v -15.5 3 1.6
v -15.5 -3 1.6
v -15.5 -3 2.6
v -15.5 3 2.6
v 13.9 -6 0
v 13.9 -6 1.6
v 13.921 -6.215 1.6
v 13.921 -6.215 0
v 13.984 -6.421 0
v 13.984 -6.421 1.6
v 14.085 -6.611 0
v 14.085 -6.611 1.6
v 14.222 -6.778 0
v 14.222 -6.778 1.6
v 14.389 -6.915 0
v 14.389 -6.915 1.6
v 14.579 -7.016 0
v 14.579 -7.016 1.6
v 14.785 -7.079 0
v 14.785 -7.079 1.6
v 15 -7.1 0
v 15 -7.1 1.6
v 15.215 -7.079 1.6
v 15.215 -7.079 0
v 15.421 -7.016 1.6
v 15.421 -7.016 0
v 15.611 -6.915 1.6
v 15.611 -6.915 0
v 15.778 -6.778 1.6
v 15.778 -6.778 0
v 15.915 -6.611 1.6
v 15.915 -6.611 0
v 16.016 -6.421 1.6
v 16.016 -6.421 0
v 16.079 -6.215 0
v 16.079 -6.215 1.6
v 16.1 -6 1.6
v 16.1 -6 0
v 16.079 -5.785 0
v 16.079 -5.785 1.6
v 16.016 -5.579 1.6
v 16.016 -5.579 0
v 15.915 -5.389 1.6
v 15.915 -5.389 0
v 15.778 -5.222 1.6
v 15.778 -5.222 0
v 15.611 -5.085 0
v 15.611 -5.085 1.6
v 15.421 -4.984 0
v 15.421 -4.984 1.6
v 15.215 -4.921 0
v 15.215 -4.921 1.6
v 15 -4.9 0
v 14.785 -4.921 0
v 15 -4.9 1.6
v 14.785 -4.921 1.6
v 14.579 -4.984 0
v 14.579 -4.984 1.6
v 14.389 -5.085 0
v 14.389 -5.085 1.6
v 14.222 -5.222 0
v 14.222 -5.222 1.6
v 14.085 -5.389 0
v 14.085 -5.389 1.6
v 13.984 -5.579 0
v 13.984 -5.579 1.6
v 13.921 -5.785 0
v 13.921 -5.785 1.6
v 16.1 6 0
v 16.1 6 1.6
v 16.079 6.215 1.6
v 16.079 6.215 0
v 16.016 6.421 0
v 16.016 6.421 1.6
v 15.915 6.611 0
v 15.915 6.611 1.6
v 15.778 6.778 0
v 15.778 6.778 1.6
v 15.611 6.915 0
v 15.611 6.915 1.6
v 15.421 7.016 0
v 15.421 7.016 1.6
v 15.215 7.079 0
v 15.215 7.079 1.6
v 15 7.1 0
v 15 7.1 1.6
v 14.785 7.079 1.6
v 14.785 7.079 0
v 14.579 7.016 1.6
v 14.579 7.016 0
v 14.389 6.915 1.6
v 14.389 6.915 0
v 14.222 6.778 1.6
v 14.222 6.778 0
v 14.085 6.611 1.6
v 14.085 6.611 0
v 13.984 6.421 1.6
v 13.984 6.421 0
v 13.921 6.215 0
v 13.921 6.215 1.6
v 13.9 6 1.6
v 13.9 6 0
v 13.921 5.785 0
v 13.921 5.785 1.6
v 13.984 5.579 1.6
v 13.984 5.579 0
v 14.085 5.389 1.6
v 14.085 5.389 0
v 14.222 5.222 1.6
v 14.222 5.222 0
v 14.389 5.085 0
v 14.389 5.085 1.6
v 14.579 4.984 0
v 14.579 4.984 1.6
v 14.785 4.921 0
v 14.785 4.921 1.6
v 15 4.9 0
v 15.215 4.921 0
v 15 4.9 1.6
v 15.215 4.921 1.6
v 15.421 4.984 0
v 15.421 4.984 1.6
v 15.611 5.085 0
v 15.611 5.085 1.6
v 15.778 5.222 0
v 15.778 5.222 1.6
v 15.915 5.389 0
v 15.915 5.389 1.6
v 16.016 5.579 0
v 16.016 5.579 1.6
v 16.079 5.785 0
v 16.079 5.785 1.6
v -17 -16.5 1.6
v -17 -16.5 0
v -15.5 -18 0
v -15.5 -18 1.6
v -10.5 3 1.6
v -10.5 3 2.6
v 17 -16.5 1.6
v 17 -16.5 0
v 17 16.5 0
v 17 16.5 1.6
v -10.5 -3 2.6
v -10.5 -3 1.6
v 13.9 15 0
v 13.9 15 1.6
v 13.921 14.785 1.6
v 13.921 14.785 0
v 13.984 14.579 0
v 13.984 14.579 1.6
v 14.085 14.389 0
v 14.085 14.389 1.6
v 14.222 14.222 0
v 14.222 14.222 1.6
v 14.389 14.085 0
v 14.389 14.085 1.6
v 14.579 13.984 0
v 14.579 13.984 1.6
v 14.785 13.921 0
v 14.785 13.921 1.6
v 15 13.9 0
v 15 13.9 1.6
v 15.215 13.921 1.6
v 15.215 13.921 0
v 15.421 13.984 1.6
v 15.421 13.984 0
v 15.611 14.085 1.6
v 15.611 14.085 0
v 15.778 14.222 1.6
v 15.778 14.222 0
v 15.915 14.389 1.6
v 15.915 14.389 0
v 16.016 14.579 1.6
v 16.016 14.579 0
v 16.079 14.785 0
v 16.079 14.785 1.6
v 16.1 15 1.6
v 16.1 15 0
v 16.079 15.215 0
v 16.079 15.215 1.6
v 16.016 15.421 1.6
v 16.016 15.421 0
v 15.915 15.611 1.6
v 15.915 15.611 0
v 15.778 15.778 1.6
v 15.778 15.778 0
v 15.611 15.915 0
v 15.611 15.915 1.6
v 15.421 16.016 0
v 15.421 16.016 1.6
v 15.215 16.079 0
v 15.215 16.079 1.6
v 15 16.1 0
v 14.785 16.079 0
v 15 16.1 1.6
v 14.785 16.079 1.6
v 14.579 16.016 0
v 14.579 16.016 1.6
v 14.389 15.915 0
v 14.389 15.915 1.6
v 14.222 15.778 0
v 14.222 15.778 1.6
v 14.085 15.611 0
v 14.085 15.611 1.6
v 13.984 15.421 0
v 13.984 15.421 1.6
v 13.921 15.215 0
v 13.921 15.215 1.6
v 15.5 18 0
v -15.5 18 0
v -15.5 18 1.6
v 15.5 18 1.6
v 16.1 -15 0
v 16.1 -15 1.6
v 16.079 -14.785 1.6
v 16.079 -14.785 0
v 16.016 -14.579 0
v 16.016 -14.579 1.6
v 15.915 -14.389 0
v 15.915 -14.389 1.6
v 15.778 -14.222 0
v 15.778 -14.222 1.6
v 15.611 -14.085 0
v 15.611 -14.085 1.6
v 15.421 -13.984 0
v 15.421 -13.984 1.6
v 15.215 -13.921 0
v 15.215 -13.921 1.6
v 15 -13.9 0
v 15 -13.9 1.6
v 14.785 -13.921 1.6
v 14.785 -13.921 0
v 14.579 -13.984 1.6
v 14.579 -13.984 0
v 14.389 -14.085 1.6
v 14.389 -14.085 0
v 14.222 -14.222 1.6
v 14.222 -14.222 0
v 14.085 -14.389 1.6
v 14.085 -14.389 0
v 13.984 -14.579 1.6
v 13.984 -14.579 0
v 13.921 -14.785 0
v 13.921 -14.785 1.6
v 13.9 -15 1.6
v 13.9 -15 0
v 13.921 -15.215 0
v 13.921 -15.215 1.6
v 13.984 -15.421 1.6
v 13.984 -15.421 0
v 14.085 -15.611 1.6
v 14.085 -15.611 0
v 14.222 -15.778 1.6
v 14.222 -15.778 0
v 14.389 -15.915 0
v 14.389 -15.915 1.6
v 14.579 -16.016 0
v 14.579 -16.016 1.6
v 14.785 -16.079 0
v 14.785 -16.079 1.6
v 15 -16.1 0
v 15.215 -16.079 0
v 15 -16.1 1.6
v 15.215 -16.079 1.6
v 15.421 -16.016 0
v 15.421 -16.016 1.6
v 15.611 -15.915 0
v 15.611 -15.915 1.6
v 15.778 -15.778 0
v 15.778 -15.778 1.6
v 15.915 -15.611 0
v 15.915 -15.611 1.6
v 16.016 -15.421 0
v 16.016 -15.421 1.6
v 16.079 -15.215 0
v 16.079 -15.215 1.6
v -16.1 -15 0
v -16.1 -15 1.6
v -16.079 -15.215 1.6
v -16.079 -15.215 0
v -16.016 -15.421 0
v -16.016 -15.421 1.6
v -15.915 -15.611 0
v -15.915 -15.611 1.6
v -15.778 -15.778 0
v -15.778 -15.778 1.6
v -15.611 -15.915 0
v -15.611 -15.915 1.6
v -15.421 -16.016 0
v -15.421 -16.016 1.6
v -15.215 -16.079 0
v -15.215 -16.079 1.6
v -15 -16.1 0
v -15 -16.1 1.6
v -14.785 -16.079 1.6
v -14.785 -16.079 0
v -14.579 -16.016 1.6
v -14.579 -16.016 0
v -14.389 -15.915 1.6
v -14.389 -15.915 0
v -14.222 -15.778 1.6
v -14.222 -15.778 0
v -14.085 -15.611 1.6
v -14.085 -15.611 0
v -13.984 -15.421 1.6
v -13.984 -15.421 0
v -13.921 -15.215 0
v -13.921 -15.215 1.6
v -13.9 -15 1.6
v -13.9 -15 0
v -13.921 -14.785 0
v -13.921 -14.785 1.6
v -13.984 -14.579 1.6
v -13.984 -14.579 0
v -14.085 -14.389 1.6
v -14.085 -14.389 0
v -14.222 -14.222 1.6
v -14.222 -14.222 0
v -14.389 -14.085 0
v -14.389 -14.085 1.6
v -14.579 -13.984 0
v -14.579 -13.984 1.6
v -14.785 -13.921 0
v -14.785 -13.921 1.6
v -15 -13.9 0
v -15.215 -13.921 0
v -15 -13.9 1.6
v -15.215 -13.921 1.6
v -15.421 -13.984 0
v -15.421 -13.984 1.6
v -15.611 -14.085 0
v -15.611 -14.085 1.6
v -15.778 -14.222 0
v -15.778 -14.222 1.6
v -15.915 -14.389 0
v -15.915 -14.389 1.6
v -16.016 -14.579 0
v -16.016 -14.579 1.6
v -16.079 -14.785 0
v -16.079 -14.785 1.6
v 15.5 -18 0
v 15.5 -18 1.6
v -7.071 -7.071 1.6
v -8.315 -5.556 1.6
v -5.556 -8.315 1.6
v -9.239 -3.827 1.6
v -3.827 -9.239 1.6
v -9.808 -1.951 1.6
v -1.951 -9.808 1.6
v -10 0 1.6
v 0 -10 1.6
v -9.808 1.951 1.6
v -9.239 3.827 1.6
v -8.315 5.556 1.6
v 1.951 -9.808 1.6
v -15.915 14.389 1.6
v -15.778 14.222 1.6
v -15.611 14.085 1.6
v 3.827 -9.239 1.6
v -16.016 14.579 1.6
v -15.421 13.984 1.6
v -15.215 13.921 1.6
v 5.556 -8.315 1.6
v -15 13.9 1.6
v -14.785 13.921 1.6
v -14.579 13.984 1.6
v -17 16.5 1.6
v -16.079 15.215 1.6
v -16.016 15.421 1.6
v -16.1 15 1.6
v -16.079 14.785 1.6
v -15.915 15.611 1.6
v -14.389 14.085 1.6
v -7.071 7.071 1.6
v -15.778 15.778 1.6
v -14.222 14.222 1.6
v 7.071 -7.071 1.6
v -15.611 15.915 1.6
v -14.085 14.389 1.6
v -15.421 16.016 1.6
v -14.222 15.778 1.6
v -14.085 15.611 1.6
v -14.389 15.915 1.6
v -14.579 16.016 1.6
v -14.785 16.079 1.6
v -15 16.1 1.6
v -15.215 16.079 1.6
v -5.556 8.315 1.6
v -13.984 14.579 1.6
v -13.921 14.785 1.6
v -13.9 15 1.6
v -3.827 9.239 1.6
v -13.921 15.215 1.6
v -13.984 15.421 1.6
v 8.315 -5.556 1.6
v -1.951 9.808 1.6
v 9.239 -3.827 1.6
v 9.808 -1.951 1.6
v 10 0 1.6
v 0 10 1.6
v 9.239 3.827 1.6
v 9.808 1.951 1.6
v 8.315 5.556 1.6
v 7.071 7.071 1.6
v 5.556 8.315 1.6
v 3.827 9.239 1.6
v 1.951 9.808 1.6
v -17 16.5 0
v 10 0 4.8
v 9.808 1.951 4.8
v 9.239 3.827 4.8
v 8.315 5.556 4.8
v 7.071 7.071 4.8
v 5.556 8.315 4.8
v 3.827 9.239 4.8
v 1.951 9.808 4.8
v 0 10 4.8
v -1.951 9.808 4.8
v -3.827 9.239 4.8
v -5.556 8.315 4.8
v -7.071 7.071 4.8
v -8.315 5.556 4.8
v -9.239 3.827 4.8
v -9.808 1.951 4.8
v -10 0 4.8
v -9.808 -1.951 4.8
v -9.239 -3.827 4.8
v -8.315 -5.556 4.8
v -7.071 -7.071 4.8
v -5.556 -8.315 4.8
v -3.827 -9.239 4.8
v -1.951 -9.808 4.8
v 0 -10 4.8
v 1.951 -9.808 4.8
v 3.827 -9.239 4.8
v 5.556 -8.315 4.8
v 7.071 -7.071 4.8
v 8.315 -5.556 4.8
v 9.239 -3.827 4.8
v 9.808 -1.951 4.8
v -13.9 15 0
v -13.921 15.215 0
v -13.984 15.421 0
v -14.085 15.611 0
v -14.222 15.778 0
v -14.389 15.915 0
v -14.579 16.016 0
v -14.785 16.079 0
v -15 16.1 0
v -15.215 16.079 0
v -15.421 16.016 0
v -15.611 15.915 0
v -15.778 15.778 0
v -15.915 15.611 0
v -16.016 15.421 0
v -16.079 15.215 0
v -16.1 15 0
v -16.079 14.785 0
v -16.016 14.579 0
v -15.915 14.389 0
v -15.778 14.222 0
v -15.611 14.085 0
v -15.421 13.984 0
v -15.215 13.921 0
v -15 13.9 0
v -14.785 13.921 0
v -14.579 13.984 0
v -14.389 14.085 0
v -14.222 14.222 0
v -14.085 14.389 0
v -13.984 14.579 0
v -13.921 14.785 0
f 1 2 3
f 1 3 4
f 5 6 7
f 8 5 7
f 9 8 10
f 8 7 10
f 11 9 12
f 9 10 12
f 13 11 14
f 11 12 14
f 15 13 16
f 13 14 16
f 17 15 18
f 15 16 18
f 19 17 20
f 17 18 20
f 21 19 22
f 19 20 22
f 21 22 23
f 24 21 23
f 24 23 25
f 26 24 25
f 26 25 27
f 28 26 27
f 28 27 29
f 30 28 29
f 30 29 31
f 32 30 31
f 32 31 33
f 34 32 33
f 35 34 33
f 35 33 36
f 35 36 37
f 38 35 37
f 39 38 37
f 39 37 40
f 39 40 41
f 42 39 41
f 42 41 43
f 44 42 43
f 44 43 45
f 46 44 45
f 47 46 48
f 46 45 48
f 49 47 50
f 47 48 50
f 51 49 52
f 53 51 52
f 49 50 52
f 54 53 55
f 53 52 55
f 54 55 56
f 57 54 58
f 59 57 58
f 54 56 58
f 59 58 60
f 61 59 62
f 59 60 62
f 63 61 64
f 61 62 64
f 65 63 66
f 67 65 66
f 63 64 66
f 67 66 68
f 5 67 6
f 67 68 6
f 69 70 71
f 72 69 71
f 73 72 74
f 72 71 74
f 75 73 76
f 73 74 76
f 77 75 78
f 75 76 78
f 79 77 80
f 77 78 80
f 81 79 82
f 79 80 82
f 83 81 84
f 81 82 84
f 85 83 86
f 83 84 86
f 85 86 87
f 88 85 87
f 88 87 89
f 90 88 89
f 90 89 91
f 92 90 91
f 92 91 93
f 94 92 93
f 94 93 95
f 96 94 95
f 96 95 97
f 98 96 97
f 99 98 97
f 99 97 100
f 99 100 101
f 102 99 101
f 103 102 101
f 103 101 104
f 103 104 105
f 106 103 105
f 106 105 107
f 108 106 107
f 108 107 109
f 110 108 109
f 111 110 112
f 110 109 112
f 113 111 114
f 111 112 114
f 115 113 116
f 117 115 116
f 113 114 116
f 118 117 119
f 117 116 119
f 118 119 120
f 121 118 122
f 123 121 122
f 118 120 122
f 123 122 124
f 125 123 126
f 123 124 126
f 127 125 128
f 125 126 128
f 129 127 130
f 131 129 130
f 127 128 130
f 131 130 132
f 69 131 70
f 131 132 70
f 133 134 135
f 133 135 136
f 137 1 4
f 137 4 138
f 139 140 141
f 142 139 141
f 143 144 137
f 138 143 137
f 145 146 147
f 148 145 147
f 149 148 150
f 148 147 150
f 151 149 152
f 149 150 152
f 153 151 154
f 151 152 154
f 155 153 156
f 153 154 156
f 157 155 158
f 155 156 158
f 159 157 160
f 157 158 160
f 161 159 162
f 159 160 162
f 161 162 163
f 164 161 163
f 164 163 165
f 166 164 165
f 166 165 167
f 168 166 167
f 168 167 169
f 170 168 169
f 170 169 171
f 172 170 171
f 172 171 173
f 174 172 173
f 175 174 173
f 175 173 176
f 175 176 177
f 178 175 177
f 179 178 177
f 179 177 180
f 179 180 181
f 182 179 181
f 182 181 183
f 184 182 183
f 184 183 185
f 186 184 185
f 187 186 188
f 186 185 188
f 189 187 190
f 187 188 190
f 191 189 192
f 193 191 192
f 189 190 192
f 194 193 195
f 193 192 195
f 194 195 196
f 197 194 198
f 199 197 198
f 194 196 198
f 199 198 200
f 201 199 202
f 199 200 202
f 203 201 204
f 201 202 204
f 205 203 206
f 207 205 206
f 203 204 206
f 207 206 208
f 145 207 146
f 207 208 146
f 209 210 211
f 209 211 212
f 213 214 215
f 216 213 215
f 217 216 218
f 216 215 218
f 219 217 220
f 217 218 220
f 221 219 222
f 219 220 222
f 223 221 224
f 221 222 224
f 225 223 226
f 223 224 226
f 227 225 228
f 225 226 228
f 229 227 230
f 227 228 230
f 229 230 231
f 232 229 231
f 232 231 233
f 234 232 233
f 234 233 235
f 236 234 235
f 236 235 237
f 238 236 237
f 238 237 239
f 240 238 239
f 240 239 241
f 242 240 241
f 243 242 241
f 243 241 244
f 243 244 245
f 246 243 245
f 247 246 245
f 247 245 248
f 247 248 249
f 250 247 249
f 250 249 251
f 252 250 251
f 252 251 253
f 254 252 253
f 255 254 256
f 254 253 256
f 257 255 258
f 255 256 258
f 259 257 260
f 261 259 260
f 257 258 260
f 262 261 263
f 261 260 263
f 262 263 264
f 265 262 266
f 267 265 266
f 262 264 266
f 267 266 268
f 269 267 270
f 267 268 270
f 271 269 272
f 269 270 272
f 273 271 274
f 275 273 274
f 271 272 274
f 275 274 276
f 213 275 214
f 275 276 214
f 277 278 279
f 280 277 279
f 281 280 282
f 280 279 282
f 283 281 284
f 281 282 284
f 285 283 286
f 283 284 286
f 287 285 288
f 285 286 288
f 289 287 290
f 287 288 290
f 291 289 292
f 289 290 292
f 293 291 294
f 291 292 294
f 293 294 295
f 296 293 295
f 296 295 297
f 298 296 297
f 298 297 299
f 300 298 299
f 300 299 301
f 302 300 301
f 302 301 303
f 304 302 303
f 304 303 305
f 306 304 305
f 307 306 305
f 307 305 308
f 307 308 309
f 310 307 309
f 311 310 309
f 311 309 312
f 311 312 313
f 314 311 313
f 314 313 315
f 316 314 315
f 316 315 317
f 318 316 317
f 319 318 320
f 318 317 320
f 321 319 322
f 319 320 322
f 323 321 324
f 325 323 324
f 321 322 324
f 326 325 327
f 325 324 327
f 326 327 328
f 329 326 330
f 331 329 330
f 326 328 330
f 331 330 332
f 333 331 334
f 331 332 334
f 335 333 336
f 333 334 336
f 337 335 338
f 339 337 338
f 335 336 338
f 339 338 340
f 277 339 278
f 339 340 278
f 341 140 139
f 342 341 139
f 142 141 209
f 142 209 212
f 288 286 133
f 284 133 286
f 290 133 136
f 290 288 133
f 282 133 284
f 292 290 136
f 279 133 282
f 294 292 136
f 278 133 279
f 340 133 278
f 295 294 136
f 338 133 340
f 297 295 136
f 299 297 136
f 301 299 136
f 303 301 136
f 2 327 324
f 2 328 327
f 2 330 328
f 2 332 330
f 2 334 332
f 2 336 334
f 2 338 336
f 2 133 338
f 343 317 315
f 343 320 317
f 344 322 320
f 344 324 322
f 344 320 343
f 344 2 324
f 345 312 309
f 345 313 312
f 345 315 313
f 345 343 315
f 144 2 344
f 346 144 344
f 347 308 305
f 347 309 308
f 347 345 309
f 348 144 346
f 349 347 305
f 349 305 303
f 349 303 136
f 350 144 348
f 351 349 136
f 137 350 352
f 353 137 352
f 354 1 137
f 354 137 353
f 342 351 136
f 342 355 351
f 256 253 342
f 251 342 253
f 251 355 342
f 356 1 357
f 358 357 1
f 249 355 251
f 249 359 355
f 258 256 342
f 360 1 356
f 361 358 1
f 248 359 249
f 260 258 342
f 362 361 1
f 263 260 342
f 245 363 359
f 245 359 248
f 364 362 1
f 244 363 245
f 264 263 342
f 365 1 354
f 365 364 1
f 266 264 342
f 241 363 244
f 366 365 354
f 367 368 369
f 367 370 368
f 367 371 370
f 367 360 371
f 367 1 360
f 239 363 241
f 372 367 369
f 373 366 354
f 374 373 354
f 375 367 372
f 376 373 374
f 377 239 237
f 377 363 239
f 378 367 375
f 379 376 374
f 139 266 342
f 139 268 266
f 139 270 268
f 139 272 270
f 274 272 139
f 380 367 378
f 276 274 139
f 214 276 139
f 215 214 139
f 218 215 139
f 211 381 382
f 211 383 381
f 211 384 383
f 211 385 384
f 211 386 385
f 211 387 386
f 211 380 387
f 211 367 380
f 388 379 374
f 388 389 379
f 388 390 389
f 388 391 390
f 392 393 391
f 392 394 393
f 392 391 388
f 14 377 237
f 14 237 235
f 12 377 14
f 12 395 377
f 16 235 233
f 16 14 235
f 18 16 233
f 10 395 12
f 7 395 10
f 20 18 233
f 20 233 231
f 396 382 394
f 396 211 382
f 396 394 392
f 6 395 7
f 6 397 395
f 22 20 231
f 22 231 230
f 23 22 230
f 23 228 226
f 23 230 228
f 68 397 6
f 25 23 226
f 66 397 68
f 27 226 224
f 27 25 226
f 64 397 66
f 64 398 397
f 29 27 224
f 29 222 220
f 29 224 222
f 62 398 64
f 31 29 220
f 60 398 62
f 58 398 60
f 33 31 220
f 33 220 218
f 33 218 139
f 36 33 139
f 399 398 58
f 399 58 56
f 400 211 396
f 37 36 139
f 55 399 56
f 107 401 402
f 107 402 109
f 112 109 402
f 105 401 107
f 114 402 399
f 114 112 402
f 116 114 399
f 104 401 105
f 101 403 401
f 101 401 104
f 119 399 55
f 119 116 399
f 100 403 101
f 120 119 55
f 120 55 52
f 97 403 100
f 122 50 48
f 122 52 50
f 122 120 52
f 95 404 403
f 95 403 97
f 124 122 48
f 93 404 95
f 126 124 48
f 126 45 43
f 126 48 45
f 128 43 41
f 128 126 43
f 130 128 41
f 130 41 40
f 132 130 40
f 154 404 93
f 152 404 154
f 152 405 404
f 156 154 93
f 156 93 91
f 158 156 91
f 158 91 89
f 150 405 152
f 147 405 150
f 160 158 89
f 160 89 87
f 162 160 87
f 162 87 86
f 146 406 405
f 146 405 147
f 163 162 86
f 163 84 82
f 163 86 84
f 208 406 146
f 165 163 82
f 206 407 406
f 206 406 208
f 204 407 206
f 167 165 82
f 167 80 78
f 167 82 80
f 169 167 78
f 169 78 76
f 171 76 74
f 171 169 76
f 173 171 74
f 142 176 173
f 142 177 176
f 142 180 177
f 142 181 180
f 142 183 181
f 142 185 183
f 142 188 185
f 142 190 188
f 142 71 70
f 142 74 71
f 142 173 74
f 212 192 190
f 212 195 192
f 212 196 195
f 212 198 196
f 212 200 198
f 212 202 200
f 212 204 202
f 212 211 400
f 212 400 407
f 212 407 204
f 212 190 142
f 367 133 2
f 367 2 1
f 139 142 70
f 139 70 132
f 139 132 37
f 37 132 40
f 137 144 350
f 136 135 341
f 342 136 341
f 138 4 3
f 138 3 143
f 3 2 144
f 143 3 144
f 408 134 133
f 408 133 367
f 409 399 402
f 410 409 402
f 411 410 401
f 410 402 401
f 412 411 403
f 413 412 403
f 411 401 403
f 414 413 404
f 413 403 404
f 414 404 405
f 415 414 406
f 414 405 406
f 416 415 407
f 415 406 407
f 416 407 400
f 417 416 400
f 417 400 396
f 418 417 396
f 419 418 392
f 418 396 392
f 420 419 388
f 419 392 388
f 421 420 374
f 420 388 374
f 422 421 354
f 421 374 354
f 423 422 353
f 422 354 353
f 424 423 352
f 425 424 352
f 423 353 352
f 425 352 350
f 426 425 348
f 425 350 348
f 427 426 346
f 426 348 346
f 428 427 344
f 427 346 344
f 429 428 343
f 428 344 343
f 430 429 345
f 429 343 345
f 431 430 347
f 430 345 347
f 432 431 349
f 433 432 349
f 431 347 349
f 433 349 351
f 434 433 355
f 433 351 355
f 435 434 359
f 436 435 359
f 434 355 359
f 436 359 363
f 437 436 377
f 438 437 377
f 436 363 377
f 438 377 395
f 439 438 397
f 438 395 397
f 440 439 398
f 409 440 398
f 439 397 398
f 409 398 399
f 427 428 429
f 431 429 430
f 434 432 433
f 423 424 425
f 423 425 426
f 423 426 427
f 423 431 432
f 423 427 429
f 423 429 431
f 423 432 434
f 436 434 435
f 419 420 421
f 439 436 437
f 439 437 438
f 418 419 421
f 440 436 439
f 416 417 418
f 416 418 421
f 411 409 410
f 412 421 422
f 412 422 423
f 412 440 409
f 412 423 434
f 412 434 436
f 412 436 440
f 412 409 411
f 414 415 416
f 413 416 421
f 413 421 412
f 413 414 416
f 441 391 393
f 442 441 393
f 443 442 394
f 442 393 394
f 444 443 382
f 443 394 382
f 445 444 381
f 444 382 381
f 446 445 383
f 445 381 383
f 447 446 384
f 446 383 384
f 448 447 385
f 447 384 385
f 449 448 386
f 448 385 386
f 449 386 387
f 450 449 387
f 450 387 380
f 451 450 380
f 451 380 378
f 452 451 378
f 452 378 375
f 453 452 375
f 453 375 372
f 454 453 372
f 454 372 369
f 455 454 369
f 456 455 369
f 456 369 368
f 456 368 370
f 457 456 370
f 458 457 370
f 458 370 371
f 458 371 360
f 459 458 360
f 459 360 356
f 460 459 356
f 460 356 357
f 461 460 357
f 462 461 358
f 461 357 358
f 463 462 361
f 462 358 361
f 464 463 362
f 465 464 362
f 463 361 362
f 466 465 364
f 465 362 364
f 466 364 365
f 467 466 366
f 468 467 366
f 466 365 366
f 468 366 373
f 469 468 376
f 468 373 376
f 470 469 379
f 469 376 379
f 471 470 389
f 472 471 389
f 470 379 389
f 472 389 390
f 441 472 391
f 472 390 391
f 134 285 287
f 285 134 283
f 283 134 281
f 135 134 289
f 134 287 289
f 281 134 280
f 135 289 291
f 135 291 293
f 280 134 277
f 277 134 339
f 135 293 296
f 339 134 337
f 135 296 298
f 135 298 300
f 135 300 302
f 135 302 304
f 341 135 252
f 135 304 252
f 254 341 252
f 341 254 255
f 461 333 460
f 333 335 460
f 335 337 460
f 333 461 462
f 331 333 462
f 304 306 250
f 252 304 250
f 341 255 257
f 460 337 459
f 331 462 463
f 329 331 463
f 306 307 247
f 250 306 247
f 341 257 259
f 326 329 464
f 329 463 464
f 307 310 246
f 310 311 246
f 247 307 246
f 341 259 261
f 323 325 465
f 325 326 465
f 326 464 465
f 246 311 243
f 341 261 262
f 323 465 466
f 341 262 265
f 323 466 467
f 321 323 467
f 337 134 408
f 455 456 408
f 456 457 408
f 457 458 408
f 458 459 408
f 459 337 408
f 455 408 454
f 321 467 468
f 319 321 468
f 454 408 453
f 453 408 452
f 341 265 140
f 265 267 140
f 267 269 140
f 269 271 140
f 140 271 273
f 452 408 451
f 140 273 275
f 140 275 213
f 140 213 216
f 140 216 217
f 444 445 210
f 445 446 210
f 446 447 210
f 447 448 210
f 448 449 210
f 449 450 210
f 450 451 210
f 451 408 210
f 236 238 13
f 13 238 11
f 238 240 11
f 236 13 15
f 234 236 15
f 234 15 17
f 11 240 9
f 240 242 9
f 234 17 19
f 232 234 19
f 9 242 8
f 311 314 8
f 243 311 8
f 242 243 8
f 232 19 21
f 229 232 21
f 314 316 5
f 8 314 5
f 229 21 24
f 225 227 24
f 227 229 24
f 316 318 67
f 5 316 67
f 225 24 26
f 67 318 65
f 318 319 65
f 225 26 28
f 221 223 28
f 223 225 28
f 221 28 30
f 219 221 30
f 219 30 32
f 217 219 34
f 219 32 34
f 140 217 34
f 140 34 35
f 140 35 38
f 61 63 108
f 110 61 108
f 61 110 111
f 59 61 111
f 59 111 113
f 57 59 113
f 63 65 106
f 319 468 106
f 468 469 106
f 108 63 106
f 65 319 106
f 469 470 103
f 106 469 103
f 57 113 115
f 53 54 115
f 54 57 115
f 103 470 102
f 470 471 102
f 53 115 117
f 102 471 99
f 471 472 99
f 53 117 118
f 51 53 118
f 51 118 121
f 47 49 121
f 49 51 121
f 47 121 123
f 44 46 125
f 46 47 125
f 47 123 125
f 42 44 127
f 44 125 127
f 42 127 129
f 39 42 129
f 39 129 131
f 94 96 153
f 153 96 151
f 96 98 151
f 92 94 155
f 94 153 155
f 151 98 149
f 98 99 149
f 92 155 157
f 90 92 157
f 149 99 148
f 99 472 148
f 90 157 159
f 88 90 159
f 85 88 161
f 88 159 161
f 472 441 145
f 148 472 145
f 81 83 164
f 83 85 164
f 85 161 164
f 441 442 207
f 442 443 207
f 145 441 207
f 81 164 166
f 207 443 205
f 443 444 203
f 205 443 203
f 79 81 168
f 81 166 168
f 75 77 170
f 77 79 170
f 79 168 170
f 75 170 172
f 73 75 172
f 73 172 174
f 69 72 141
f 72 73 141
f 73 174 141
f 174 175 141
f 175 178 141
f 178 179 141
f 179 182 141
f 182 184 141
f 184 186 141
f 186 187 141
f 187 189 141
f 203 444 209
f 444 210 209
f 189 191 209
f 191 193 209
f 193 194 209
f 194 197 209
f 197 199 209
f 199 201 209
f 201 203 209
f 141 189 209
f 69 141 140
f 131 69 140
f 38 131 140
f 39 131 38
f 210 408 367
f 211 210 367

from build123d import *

# Parameters (mm, degrees)
SKETCH1_W           = 34
SKETCH1_H           = 36
BOSS_EXTRUDE1_DEPTH = 1.6
CHAMFER1_SIZE       = 1.5
SKETCH2_R           = 1.1
CUT_EXTRUDE1_DEPTH  = 25.810481656
SKETCH3_R           = 10
BOSS_EXTRUDE2_DEPTH = 3.2
SKETCH4_W           = 5
SKETCH4_H           = 6
BOSS_EXTRUDE3_DEPTH = 1


with BuildPart() as part:
    # Sketch1 → Boss-Extrude1 (new body)
    with BuildSketch(Plane.XY):
        Rectangle(SKETCH1_W, SKETCH1_H)
    extrude(amount=BOSS_EXTRUDE1_DEPTH)

    # Chamfer1
    chamfer1_edges = [part.edges().sort_by_distance(p)[0] for p in [
        (-17, 18, 0.8),
        (17, 18, 0.8),
        (17, -18, 0.8),
        (-17, -18, 0.8),
    ]]
    chamfer(chamfer1_edges, length=CHAMFER1_SIZE)

    # Sketch2 → Cut-Extrude1 (cut, through all)
    with BuildSketch(Plane.XY.offset(1.6)):
        with Locations((-15, 15)):
            Circle(SKETCH2_R)
        with Locations((15, 6)):
            Circle(SKETCH2_R)
        with Locations(Location((-15, -15, 0), (0, 0, 180))):
            Circle(SKETCH2_R)
        with Locations((15, -15)):
            Circle(SKETCH2_R)
        with Locations(Location((15, 15, 0), (0, 0, 180))):
            Circle(SKETCH2_R)
        with Locations(Location((15, -6, 0), (0, 0, 180))):
            Circle(SKETCH2_R)
    extrude(amount=-CUT_EXTRUDE1_DEPTH, mode=Mode.SUBTRACT)

    # Sketch3 → Boss-Extrude2 (add)
    with BuildSketch(Plane.XY.offset(1.6)):
        Circle(SKETCH3_R)
    extrude(amount=BOSS_EXTRUDE2_DEPTH)

    # Sketch4 → Boss-Extrude3 (add)
    with BuildSketch(Plane.XY.offset(1.6)):
        with Locations((-13, 0)):
            Rectangle(SKETCH4_W, SKETCH4_H)
    extrude(amount=BOSS_EXTRUDE3_DEPTH)


solid = part.part
